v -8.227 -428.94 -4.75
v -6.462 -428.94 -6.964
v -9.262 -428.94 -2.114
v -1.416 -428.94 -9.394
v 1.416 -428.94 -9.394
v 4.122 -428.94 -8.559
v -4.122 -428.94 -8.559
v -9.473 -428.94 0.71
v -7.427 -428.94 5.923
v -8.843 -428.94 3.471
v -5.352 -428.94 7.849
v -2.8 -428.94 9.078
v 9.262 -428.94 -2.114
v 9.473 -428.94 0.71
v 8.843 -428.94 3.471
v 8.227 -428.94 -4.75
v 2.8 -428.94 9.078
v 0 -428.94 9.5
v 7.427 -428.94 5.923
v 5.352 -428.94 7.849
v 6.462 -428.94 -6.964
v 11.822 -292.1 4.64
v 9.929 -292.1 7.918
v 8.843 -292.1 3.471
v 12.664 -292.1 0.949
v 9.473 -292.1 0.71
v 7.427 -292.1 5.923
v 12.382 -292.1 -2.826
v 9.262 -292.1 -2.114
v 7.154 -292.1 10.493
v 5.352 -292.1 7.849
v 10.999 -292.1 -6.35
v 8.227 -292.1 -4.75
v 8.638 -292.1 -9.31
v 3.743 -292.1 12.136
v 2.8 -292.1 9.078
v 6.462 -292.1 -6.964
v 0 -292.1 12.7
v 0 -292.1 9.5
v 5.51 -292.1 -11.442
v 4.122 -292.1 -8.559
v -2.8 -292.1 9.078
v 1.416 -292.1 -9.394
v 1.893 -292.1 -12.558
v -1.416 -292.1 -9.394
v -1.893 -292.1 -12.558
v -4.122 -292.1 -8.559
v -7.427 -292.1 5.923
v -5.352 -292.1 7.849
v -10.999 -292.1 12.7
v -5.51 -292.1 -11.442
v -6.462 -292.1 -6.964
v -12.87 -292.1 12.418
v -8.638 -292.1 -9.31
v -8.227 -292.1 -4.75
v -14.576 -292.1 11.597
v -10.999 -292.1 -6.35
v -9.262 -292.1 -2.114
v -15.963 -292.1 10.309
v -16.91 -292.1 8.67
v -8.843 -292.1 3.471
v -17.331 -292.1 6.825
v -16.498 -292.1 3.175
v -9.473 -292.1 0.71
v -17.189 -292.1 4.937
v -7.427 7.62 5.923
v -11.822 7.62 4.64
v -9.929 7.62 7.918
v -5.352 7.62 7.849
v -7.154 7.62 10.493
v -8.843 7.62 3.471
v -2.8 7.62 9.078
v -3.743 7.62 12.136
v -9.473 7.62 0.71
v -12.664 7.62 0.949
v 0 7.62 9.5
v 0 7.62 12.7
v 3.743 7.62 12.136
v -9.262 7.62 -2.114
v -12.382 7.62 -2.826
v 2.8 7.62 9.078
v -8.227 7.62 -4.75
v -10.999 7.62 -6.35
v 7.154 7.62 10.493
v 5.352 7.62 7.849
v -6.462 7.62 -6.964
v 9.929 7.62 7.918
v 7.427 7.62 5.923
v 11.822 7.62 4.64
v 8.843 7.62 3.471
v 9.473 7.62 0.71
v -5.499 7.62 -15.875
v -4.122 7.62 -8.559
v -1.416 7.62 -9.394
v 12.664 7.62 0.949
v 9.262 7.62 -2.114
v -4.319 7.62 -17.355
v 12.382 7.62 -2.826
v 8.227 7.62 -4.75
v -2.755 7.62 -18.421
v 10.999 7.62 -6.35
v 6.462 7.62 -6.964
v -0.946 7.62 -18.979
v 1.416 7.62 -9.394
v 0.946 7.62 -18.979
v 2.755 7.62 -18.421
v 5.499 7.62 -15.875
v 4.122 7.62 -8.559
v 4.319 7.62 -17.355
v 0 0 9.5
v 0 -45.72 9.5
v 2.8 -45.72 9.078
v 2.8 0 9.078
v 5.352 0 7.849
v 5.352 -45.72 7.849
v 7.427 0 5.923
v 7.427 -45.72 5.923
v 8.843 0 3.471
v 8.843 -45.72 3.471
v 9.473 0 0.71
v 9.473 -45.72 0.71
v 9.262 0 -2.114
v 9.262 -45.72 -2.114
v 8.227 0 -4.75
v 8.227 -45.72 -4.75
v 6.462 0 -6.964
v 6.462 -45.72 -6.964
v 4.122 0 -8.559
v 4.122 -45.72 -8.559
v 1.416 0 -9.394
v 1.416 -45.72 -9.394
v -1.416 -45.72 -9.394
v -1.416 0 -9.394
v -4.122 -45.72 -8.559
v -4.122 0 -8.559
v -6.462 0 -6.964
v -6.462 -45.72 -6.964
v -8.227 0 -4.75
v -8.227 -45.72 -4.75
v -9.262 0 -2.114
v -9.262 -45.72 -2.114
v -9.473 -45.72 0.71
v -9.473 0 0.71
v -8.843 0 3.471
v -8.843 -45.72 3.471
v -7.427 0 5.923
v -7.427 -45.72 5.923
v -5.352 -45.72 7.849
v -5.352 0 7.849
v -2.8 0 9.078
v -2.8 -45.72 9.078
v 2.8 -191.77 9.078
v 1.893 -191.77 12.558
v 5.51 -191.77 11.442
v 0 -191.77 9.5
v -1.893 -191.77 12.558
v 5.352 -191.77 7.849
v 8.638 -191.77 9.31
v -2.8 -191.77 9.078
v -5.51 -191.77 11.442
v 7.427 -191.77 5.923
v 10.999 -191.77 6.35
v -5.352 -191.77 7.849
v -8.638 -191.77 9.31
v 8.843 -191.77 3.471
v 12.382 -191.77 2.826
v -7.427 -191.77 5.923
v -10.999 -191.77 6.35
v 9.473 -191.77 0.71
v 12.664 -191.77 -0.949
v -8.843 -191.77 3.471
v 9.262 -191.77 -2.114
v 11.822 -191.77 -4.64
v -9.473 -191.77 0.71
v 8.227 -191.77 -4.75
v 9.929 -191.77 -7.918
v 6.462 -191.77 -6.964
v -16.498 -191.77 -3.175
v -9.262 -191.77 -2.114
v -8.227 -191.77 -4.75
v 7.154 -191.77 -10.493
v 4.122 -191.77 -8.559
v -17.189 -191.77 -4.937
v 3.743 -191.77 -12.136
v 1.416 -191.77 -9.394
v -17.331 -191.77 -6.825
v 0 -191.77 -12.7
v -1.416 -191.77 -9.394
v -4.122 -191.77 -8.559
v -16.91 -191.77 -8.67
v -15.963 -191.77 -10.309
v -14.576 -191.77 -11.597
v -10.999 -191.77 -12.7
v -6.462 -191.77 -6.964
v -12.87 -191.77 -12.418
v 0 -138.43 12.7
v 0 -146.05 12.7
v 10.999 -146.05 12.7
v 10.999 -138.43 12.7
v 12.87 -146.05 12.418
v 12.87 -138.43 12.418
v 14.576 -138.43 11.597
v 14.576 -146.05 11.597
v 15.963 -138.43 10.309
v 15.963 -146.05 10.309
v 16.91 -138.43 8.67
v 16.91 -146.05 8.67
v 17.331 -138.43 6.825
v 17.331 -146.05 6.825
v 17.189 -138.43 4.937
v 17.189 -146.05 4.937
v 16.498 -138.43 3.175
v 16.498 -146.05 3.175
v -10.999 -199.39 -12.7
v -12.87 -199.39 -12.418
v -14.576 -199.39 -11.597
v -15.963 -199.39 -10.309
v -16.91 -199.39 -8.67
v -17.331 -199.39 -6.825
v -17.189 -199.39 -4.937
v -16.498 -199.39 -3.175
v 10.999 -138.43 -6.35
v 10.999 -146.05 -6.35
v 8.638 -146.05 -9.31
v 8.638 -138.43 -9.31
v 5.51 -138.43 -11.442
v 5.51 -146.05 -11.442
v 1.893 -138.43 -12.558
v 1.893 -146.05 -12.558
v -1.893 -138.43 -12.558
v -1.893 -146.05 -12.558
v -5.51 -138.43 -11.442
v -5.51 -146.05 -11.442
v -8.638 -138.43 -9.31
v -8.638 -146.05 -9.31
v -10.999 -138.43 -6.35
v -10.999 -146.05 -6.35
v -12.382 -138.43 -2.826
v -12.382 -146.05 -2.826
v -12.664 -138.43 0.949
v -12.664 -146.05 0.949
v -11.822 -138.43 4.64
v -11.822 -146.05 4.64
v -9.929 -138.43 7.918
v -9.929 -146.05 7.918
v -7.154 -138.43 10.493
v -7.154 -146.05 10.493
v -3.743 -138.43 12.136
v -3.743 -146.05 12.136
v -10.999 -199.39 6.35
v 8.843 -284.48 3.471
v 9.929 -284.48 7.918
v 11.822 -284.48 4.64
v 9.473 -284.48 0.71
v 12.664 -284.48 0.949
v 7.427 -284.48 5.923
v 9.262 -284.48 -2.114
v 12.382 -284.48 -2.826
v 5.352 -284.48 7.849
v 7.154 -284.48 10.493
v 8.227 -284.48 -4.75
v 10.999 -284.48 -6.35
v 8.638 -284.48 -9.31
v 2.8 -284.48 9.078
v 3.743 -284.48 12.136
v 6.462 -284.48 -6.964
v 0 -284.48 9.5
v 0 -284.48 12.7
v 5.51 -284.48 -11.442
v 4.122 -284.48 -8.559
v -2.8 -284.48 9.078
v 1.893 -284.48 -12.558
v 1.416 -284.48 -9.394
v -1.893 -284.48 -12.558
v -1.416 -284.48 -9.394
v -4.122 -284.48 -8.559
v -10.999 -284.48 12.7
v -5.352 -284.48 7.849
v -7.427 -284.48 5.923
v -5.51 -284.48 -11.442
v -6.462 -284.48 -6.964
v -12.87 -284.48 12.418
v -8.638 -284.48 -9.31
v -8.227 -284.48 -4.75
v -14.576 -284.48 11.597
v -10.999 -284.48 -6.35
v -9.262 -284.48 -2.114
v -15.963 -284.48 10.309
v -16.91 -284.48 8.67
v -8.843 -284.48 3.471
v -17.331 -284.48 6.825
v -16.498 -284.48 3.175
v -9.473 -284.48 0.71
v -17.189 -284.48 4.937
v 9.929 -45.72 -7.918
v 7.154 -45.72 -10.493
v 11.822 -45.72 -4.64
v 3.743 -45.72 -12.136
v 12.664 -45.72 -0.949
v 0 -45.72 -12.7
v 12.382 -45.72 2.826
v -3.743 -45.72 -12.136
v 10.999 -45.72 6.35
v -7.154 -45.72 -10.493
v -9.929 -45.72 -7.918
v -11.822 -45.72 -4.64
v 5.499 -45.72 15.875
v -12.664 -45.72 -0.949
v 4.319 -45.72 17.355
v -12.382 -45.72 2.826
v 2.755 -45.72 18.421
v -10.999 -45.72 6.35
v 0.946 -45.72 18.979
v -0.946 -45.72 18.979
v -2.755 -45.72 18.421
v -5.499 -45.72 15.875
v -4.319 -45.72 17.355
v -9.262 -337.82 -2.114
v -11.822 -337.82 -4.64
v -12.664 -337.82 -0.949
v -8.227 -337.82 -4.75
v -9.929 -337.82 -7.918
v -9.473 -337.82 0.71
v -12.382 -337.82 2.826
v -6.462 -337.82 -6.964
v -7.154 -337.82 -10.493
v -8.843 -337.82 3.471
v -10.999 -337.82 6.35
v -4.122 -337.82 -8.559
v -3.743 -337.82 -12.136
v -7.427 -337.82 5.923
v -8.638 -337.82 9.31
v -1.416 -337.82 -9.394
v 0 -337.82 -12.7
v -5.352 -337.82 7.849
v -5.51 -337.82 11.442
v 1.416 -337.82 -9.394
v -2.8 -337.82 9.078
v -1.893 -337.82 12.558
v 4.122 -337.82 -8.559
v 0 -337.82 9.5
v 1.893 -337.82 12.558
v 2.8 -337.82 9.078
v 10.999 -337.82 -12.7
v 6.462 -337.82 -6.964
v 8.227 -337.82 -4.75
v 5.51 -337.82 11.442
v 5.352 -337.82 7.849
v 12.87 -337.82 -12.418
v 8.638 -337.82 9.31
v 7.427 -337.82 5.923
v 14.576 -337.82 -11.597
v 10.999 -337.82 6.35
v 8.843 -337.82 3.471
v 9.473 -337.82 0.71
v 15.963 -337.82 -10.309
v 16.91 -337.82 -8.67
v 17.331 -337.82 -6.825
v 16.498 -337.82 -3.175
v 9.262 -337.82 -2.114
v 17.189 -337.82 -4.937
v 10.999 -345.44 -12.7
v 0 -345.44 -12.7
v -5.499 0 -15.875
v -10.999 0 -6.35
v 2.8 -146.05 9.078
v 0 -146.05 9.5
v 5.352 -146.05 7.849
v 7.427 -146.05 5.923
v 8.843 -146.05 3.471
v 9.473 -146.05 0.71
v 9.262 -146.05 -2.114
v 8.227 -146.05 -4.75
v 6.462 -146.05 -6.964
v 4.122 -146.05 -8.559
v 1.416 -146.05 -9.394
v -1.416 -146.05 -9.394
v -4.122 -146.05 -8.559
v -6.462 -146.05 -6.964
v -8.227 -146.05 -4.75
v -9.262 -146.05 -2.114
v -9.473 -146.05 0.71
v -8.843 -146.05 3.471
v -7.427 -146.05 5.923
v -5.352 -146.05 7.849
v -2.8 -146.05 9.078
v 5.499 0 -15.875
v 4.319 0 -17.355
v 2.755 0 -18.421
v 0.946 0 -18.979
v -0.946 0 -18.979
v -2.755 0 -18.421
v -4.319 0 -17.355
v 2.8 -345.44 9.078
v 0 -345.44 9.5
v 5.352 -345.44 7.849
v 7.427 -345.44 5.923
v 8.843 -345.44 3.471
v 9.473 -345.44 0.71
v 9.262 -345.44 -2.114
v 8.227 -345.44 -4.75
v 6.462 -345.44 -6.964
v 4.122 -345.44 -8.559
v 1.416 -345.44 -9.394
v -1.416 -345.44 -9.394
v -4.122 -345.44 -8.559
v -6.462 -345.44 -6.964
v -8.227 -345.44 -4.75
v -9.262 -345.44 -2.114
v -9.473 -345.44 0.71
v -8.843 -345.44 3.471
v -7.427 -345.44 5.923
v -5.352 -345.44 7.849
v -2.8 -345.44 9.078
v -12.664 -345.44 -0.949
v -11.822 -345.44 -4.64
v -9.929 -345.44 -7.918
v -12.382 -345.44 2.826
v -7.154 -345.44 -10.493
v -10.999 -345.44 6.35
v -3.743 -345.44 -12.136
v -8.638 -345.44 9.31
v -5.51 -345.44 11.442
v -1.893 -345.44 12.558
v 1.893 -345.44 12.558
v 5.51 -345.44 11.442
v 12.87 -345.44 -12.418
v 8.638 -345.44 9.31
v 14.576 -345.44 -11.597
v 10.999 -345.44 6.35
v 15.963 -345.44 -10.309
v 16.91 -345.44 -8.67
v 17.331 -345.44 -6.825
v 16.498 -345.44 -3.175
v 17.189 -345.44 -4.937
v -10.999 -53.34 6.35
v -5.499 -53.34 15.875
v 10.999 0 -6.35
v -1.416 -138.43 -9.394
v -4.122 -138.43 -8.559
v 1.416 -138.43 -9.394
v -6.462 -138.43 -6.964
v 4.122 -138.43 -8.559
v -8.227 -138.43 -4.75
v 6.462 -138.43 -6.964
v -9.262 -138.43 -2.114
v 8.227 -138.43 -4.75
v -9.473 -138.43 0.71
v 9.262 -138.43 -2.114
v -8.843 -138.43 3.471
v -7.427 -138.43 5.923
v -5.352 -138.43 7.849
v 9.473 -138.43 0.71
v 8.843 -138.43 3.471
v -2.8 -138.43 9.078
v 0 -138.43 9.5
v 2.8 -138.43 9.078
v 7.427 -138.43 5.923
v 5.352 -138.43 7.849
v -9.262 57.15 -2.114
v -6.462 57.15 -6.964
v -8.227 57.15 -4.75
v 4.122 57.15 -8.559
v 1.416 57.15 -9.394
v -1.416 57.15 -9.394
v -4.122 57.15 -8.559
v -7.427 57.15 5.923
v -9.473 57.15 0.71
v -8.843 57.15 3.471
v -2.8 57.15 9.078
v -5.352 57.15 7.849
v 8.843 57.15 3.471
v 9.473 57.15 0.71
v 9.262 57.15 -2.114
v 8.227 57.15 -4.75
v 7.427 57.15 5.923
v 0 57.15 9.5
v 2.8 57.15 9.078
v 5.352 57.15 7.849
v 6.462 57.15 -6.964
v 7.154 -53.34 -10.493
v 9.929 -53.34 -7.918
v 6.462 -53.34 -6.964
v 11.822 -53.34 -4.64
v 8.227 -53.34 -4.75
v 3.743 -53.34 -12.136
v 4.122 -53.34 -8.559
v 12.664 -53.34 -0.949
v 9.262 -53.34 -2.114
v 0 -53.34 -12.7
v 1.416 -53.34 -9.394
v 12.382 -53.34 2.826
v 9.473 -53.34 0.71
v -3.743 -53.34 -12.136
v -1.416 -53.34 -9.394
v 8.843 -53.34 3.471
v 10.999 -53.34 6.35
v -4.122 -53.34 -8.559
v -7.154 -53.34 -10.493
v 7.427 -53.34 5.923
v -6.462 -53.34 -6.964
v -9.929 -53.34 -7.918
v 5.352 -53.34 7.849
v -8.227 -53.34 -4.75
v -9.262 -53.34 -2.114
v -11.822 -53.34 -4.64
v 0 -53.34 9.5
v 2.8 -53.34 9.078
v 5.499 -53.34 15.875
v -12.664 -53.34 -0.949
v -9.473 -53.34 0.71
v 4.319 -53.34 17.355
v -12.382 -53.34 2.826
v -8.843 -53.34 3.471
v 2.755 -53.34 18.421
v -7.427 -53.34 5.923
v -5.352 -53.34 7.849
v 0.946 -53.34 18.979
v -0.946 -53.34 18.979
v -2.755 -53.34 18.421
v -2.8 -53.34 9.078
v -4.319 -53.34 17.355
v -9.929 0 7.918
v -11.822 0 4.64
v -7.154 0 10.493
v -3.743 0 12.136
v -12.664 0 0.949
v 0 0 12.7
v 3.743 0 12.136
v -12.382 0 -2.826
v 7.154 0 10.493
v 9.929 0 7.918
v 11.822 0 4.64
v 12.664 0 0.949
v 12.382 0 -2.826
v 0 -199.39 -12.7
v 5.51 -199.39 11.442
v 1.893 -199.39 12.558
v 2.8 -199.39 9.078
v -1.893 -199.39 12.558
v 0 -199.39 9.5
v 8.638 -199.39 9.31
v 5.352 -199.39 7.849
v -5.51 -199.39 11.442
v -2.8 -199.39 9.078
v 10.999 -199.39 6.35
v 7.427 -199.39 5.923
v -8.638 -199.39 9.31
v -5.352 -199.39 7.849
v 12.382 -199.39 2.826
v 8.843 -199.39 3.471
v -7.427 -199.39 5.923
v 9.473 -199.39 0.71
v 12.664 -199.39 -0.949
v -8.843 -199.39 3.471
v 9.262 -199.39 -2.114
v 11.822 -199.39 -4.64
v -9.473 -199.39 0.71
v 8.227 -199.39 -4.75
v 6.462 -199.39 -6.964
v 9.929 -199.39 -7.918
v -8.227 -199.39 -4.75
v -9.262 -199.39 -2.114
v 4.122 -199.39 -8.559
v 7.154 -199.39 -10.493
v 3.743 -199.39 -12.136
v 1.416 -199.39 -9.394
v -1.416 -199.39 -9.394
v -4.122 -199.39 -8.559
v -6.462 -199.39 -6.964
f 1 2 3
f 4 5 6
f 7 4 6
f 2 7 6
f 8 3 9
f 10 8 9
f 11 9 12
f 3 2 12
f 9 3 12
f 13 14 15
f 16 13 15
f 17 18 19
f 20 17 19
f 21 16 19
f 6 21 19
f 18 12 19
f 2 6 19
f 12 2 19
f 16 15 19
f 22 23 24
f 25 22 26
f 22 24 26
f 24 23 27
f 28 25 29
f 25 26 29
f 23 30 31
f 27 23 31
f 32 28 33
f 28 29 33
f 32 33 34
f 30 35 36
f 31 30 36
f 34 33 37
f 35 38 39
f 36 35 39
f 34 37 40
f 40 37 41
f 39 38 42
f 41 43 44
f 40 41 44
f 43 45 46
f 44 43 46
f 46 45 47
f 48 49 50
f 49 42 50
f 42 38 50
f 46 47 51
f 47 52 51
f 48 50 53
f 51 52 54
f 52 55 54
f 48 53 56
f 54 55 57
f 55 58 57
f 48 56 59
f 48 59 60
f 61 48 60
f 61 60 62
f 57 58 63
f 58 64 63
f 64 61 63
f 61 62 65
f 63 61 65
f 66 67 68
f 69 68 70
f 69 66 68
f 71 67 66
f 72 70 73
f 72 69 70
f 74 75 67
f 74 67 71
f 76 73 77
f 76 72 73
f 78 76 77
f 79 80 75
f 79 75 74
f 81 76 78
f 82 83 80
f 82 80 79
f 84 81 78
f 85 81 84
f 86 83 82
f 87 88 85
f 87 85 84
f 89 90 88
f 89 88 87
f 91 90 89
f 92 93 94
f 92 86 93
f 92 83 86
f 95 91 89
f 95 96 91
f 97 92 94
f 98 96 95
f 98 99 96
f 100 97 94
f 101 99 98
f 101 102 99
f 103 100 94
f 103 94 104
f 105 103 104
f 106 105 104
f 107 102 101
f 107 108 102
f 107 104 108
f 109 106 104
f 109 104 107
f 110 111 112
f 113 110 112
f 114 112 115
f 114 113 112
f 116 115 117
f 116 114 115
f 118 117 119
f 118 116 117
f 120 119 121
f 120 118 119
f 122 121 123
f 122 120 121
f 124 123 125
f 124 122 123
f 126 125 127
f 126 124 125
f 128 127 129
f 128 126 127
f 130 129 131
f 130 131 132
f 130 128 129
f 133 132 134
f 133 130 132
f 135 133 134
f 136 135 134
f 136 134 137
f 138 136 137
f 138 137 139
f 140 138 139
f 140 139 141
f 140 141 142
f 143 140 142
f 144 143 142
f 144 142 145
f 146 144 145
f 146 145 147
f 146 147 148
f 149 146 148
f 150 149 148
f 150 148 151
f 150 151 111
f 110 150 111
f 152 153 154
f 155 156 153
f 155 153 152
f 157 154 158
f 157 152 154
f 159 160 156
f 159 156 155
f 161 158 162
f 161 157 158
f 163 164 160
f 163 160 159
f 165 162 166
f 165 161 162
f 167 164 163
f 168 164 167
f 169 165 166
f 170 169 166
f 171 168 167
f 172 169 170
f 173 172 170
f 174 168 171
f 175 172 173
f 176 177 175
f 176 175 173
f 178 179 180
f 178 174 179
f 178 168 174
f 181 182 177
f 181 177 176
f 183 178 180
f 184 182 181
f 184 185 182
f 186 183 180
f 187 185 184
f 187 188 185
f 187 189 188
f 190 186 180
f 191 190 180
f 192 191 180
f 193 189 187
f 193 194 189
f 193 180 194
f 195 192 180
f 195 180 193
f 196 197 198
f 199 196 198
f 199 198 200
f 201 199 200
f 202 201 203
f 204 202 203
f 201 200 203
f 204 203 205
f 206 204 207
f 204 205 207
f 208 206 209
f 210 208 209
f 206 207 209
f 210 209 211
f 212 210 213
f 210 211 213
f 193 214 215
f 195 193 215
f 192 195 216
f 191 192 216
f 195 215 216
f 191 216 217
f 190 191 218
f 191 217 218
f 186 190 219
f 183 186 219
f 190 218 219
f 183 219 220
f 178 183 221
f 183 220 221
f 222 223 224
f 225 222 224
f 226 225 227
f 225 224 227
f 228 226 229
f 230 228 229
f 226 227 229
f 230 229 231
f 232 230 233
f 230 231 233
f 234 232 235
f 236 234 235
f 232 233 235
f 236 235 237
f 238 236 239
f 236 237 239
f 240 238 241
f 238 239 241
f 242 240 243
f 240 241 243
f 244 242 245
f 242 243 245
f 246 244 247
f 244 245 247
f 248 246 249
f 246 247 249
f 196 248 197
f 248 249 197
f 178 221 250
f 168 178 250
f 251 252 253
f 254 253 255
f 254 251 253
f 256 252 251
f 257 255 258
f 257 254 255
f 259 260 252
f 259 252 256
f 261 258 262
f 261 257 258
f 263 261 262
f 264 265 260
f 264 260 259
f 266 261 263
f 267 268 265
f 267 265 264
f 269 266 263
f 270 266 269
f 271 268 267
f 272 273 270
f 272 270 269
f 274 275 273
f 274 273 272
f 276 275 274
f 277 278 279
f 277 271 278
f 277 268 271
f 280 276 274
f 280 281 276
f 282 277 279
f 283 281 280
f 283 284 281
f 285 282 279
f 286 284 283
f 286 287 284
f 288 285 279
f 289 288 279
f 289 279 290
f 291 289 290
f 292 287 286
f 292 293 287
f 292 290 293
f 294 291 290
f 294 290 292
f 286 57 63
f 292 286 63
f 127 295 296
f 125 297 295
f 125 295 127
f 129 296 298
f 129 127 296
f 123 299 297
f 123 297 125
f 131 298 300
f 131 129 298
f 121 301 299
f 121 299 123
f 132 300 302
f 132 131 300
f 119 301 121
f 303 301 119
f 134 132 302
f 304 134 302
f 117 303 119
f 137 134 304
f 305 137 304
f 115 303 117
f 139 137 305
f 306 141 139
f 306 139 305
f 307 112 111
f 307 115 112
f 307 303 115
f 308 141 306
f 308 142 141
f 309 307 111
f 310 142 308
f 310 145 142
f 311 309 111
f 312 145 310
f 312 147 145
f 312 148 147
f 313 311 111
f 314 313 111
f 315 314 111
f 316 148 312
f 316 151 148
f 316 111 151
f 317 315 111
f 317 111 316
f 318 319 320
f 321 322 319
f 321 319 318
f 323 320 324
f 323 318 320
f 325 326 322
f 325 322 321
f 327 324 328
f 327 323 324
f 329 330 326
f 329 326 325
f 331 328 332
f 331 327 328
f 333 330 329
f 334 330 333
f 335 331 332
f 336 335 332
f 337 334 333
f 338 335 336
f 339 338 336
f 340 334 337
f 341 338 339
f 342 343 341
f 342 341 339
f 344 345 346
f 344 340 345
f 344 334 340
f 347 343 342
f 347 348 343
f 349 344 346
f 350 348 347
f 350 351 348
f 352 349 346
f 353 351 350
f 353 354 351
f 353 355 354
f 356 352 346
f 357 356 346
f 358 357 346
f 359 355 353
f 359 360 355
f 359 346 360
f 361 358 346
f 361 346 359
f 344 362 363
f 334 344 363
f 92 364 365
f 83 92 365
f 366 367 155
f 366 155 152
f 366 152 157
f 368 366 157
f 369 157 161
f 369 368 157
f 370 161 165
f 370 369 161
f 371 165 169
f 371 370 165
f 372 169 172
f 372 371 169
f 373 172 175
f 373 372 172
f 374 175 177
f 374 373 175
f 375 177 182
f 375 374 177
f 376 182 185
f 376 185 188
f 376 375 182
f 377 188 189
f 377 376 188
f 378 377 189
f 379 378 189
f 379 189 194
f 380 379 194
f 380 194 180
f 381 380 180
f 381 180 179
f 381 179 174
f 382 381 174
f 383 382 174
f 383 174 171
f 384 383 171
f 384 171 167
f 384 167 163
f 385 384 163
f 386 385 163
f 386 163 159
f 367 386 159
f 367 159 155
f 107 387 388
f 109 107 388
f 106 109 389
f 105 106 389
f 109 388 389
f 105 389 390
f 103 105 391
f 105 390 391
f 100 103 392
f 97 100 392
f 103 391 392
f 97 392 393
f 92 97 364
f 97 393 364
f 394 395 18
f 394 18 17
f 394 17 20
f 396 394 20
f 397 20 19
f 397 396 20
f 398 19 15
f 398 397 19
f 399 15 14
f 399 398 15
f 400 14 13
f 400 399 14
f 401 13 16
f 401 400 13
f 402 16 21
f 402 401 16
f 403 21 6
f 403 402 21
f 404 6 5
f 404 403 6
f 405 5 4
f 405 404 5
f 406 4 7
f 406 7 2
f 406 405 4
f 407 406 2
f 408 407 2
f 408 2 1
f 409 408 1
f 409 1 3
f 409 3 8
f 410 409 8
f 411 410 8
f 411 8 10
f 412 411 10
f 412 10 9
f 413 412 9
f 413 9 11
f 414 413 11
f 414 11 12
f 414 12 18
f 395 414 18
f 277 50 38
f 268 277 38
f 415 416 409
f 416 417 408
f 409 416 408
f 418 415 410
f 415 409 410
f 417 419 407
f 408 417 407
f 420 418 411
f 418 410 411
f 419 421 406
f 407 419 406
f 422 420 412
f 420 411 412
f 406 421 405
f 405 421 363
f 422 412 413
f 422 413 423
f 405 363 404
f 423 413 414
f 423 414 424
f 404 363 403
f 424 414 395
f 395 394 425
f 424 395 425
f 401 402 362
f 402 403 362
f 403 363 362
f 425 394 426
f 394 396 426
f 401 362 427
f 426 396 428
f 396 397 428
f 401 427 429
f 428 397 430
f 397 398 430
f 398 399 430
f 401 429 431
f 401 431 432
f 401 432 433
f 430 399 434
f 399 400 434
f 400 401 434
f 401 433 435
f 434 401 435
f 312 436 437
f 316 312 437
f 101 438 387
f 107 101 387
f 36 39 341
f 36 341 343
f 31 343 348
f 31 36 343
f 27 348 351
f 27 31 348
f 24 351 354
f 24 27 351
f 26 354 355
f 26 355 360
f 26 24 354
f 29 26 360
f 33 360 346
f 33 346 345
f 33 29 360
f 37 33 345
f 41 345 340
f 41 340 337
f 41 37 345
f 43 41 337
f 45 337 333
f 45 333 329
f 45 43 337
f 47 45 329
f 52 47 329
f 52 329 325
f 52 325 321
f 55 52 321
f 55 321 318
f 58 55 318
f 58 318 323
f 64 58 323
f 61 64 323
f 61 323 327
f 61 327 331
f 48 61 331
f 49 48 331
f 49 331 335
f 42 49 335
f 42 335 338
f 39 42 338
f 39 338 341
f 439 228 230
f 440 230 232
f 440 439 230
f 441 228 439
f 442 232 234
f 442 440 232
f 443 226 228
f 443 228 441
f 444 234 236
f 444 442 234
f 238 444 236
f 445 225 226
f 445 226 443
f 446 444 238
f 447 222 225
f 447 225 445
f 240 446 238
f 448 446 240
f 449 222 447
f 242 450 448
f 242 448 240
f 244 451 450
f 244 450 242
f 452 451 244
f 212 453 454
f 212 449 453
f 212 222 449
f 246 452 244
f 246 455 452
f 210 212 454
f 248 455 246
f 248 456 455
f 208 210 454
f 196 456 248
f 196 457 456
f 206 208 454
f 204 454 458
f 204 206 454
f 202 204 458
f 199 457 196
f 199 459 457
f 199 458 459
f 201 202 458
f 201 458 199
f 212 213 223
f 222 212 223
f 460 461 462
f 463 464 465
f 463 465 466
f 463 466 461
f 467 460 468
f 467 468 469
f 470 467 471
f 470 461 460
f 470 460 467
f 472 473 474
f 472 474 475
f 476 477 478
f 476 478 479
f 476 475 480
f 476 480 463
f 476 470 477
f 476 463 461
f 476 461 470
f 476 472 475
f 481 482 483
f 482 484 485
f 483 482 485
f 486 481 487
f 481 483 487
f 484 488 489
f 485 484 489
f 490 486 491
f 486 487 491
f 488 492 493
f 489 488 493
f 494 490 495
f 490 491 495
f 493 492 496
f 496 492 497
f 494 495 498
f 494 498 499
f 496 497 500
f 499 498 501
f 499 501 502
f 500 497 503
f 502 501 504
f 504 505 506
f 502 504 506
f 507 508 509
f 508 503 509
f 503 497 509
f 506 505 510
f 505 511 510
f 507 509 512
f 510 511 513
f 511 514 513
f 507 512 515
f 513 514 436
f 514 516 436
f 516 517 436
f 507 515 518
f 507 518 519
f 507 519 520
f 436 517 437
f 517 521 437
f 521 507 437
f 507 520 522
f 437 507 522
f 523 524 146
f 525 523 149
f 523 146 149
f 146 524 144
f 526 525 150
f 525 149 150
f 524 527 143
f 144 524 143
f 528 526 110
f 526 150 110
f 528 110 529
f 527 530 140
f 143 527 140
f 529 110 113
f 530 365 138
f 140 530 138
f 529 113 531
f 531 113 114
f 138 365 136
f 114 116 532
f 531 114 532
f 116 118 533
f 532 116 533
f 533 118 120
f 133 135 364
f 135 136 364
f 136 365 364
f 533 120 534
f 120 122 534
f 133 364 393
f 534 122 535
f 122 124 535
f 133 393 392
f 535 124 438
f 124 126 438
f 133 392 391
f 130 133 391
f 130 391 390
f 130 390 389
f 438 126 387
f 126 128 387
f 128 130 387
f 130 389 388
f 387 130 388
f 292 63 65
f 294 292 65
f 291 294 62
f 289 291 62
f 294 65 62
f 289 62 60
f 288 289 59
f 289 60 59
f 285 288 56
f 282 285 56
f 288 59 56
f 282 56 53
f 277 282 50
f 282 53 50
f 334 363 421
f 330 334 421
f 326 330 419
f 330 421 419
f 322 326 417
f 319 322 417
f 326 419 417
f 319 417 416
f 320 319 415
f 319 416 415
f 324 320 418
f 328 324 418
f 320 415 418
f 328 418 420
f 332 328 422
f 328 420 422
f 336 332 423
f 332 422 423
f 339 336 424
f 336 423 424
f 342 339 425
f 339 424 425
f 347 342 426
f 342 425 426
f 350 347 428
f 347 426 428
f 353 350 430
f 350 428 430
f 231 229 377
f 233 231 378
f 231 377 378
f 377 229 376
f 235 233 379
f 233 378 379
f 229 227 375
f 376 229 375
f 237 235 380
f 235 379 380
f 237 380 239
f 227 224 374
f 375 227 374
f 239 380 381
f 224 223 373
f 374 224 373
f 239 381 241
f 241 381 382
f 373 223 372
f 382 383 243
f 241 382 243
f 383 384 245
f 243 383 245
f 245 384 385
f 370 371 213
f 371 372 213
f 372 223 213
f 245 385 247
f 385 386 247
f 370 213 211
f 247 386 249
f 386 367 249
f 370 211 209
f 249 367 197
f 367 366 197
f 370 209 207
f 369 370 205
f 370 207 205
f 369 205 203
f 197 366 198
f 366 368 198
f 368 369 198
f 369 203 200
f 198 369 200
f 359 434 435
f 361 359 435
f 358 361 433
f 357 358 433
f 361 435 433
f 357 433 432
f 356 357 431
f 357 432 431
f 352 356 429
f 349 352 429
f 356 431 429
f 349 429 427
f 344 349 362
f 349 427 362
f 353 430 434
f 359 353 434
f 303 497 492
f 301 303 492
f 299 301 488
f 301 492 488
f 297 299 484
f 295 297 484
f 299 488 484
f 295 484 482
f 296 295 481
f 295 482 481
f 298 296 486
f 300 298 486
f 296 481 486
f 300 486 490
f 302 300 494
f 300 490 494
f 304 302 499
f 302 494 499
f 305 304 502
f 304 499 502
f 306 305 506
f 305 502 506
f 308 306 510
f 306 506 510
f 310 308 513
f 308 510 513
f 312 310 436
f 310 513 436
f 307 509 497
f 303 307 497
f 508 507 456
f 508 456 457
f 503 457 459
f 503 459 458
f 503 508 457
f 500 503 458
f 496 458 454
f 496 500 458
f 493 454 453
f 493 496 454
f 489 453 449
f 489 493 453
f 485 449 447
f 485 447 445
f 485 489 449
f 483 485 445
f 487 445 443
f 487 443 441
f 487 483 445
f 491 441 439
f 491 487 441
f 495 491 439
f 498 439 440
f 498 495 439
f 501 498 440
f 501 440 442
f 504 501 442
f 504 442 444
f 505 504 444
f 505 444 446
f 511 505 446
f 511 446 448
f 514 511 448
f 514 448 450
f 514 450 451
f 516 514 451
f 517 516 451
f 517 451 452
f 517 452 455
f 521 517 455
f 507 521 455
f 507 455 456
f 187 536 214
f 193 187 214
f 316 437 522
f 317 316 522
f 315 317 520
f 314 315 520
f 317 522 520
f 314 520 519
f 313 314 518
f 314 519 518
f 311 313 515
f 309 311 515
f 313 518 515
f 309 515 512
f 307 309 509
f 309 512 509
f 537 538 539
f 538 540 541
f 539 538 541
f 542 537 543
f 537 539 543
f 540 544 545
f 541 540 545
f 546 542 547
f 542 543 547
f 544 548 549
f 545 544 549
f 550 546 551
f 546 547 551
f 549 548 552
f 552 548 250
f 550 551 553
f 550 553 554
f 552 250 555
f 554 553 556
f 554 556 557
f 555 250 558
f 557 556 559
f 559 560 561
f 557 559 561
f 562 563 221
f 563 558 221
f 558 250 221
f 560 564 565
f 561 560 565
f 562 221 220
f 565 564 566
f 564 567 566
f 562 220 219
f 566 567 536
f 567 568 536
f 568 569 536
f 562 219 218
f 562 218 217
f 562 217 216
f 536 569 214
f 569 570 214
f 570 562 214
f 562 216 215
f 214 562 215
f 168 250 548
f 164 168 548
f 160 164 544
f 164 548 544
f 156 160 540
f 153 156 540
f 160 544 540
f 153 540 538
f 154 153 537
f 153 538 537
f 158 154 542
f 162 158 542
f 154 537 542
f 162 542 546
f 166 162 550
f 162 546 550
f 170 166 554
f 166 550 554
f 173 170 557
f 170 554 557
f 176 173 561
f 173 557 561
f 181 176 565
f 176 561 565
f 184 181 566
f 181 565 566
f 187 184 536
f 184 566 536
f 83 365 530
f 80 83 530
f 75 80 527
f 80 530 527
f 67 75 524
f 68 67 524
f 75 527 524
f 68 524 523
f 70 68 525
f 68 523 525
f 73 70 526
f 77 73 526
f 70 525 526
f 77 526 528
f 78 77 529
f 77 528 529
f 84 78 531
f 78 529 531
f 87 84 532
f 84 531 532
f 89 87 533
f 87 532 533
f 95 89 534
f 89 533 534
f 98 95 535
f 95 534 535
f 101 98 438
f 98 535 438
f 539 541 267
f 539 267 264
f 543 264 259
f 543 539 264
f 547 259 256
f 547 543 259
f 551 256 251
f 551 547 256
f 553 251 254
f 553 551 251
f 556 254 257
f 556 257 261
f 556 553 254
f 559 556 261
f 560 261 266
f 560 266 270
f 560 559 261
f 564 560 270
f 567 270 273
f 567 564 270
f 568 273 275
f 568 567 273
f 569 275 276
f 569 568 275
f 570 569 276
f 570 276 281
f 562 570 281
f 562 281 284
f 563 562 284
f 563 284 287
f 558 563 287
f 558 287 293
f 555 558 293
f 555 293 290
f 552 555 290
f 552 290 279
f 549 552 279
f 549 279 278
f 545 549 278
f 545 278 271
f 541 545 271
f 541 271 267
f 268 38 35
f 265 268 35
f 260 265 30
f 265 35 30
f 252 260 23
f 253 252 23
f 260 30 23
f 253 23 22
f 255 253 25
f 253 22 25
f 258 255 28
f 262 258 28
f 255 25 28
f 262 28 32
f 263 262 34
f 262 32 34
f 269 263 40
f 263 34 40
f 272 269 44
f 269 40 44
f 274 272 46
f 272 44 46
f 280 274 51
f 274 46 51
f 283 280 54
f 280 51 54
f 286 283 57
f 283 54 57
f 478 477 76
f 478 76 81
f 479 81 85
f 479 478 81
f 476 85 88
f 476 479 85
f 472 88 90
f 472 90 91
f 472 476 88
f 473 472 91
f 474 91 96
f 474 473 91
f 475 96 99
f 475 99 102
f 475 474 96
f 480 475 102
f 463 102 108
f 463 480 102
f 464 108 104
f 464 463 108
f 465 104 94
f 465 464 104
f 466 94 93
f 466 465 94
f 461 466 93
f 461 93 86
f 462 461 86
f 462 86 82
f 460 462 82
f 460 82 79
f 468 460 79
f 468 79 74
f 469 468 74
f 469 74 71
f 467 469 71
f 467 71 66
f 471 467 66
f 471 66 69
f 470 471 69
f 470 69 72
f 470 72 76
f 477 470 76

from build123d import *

# Parameters (mm, degrees)
BOSS_EXTRUDE1_DEPTH   = 7.62
LPATTERN2_COUNT       = 2
LPATTERN2_PITCH       = 53.34
BODY_MOVE_COPY1_ANGLE = 180
LPATTERN3_COUNT       = 3
LPATTERN3_PITCH       = 146.05
BODY_MOVE_COPY2_ANGLE = 120
BODY_MOVE_COPY3_ANGLE = 120
BOSS_EXTRUDE2_START   = 57.15
SKETCH2_R             = 9.5
BOSS_EXTRUDE2_DEPTH   = 486.09


with BuildPart() as part:
    # Sketch1 → Boss-Extrude1 (new body)
    with BuildSketch(Plane(origin=(0, 0, 0), x_dir=(1, 0, 0), z_dir=(0, 1, 0))):
        with BuildLine():
            Line((-5.499261314, 15.875), (-10.998522628, 6.35))
            ThreePointArc((-10.998522628, 6.35), (0, -12.7), (10.998522628, 6.35))
            Line((10.998522628, 6.35), (5.499261314, 15.875))
            ThreePointArc((5.499261314, 15.875), (0, 19.05), (-5.499261314, 15.875))
        make_face()
    extrude(amount=BOSS_EXTRUDE1_DEPTH)


with BuildPart() as lpattern2_1:
    # LPattern2: pattern copy
    add(part.part.moved(Location(Vector(0, -1, 0) * (1 * LPATTERN2_PITCH))))


with BuildPart() as lpattern2_1_1:
    # Body-Move/Copy1: moved
    add(lpattern2_1.part.rotate(Axis((0, 0, 0), (0, 1, 0)), BODY_MOVE_COPY1_ANGLE))


with BuildPart() as lpattern3_1:
    # LPattern3: pattern copy
    add(part.part.moved(Location(Vector(0, -1, 0) * (1 * LPATTERN3_PITCH))))


with BuildPart() as lpattern3_2:
    # LPattern3: pattern copy
    add(part.part.moved(Location(Vector(0, -1, 0) * (2 * LPATTERN3_PITCH))))


with BuildPart() as lpattern3_3:
    # LPattern3: pattern copy
    add(lpattern2_1_1.part.moved(Location(Vector(0, -1, 0) * (1 * LPATTERN3_PITCH))))


with BuildPart() as lpattern3_4:
    # LPattern3: pattern copy
    add(lpattern2_1_1.part.moved(Location(Vector(0, -1, 0) * (2 * LPATTERN3_PITCH))))


with BuildPart() as lpattern3_1_1:
    # Body-Move/Copy2: moved
    add(lpattern3_1.part.rotate(Axis((0, 0, 0), (0, -1, 0)), BODY_MOVE_COPY2_ANGLE))


with BuildPart() as lpattern3_3_1:
    # Body-Move/Copy2: moved
    add(lpattern3_3.part.rotate(Axis((0, 0, 0), (0, -1, 0)), BODY_MOVE_COPY2_ANGLE))


with BuildPart() as lpattern3_2_1:
    # Body-Move/Copy3: moved
    add(lpattern3_2.part.rotate(Axis((0, 0, 0), (0, 1, 0)), BODY_MOVE_COPY3_ANGLE))


with BuildPart() as lpattern3_4_1:
    # Body-Move/Copy3: moved
    add(lpattern3_4.part.rotate(Axis((0, 0, 0), (0, 1, 0)), BODY_MOVE_COPY3_ANGLE))


with BuildPart() as part_1:
    add(part.part)

    add(lpattern2_1_1.part)  # Boss-Extrude2 merges LPattern2_1

    add(lpattern3_1_1.part)  # Boss-Extrude2 merges LPattern3_1

    add(lpattern3_2_1.part)  # Boss-Extrude2 merges LPattern3_2

    add(lpattern3_3_1.part)  # Boss-Extrude2 merges LPattern3_3

    add(lpattern3_4_1.part)  # Boss-Extrude2 merges LPattern3_4
    # Sketch2 → Boss-Extrude2 (add)
    with BuildSketch(Plane(origin=(0, 0, 0), x_dir=(1, 0, 0), z_dir=(0, 1, 0)).offset(BOSS_EXTRUDE2_START)):
        Circle(SKETCH2_R)
    extrude(amount=-BOSS_EXTRUDE2_DEPTH)


solid = part_1.part
